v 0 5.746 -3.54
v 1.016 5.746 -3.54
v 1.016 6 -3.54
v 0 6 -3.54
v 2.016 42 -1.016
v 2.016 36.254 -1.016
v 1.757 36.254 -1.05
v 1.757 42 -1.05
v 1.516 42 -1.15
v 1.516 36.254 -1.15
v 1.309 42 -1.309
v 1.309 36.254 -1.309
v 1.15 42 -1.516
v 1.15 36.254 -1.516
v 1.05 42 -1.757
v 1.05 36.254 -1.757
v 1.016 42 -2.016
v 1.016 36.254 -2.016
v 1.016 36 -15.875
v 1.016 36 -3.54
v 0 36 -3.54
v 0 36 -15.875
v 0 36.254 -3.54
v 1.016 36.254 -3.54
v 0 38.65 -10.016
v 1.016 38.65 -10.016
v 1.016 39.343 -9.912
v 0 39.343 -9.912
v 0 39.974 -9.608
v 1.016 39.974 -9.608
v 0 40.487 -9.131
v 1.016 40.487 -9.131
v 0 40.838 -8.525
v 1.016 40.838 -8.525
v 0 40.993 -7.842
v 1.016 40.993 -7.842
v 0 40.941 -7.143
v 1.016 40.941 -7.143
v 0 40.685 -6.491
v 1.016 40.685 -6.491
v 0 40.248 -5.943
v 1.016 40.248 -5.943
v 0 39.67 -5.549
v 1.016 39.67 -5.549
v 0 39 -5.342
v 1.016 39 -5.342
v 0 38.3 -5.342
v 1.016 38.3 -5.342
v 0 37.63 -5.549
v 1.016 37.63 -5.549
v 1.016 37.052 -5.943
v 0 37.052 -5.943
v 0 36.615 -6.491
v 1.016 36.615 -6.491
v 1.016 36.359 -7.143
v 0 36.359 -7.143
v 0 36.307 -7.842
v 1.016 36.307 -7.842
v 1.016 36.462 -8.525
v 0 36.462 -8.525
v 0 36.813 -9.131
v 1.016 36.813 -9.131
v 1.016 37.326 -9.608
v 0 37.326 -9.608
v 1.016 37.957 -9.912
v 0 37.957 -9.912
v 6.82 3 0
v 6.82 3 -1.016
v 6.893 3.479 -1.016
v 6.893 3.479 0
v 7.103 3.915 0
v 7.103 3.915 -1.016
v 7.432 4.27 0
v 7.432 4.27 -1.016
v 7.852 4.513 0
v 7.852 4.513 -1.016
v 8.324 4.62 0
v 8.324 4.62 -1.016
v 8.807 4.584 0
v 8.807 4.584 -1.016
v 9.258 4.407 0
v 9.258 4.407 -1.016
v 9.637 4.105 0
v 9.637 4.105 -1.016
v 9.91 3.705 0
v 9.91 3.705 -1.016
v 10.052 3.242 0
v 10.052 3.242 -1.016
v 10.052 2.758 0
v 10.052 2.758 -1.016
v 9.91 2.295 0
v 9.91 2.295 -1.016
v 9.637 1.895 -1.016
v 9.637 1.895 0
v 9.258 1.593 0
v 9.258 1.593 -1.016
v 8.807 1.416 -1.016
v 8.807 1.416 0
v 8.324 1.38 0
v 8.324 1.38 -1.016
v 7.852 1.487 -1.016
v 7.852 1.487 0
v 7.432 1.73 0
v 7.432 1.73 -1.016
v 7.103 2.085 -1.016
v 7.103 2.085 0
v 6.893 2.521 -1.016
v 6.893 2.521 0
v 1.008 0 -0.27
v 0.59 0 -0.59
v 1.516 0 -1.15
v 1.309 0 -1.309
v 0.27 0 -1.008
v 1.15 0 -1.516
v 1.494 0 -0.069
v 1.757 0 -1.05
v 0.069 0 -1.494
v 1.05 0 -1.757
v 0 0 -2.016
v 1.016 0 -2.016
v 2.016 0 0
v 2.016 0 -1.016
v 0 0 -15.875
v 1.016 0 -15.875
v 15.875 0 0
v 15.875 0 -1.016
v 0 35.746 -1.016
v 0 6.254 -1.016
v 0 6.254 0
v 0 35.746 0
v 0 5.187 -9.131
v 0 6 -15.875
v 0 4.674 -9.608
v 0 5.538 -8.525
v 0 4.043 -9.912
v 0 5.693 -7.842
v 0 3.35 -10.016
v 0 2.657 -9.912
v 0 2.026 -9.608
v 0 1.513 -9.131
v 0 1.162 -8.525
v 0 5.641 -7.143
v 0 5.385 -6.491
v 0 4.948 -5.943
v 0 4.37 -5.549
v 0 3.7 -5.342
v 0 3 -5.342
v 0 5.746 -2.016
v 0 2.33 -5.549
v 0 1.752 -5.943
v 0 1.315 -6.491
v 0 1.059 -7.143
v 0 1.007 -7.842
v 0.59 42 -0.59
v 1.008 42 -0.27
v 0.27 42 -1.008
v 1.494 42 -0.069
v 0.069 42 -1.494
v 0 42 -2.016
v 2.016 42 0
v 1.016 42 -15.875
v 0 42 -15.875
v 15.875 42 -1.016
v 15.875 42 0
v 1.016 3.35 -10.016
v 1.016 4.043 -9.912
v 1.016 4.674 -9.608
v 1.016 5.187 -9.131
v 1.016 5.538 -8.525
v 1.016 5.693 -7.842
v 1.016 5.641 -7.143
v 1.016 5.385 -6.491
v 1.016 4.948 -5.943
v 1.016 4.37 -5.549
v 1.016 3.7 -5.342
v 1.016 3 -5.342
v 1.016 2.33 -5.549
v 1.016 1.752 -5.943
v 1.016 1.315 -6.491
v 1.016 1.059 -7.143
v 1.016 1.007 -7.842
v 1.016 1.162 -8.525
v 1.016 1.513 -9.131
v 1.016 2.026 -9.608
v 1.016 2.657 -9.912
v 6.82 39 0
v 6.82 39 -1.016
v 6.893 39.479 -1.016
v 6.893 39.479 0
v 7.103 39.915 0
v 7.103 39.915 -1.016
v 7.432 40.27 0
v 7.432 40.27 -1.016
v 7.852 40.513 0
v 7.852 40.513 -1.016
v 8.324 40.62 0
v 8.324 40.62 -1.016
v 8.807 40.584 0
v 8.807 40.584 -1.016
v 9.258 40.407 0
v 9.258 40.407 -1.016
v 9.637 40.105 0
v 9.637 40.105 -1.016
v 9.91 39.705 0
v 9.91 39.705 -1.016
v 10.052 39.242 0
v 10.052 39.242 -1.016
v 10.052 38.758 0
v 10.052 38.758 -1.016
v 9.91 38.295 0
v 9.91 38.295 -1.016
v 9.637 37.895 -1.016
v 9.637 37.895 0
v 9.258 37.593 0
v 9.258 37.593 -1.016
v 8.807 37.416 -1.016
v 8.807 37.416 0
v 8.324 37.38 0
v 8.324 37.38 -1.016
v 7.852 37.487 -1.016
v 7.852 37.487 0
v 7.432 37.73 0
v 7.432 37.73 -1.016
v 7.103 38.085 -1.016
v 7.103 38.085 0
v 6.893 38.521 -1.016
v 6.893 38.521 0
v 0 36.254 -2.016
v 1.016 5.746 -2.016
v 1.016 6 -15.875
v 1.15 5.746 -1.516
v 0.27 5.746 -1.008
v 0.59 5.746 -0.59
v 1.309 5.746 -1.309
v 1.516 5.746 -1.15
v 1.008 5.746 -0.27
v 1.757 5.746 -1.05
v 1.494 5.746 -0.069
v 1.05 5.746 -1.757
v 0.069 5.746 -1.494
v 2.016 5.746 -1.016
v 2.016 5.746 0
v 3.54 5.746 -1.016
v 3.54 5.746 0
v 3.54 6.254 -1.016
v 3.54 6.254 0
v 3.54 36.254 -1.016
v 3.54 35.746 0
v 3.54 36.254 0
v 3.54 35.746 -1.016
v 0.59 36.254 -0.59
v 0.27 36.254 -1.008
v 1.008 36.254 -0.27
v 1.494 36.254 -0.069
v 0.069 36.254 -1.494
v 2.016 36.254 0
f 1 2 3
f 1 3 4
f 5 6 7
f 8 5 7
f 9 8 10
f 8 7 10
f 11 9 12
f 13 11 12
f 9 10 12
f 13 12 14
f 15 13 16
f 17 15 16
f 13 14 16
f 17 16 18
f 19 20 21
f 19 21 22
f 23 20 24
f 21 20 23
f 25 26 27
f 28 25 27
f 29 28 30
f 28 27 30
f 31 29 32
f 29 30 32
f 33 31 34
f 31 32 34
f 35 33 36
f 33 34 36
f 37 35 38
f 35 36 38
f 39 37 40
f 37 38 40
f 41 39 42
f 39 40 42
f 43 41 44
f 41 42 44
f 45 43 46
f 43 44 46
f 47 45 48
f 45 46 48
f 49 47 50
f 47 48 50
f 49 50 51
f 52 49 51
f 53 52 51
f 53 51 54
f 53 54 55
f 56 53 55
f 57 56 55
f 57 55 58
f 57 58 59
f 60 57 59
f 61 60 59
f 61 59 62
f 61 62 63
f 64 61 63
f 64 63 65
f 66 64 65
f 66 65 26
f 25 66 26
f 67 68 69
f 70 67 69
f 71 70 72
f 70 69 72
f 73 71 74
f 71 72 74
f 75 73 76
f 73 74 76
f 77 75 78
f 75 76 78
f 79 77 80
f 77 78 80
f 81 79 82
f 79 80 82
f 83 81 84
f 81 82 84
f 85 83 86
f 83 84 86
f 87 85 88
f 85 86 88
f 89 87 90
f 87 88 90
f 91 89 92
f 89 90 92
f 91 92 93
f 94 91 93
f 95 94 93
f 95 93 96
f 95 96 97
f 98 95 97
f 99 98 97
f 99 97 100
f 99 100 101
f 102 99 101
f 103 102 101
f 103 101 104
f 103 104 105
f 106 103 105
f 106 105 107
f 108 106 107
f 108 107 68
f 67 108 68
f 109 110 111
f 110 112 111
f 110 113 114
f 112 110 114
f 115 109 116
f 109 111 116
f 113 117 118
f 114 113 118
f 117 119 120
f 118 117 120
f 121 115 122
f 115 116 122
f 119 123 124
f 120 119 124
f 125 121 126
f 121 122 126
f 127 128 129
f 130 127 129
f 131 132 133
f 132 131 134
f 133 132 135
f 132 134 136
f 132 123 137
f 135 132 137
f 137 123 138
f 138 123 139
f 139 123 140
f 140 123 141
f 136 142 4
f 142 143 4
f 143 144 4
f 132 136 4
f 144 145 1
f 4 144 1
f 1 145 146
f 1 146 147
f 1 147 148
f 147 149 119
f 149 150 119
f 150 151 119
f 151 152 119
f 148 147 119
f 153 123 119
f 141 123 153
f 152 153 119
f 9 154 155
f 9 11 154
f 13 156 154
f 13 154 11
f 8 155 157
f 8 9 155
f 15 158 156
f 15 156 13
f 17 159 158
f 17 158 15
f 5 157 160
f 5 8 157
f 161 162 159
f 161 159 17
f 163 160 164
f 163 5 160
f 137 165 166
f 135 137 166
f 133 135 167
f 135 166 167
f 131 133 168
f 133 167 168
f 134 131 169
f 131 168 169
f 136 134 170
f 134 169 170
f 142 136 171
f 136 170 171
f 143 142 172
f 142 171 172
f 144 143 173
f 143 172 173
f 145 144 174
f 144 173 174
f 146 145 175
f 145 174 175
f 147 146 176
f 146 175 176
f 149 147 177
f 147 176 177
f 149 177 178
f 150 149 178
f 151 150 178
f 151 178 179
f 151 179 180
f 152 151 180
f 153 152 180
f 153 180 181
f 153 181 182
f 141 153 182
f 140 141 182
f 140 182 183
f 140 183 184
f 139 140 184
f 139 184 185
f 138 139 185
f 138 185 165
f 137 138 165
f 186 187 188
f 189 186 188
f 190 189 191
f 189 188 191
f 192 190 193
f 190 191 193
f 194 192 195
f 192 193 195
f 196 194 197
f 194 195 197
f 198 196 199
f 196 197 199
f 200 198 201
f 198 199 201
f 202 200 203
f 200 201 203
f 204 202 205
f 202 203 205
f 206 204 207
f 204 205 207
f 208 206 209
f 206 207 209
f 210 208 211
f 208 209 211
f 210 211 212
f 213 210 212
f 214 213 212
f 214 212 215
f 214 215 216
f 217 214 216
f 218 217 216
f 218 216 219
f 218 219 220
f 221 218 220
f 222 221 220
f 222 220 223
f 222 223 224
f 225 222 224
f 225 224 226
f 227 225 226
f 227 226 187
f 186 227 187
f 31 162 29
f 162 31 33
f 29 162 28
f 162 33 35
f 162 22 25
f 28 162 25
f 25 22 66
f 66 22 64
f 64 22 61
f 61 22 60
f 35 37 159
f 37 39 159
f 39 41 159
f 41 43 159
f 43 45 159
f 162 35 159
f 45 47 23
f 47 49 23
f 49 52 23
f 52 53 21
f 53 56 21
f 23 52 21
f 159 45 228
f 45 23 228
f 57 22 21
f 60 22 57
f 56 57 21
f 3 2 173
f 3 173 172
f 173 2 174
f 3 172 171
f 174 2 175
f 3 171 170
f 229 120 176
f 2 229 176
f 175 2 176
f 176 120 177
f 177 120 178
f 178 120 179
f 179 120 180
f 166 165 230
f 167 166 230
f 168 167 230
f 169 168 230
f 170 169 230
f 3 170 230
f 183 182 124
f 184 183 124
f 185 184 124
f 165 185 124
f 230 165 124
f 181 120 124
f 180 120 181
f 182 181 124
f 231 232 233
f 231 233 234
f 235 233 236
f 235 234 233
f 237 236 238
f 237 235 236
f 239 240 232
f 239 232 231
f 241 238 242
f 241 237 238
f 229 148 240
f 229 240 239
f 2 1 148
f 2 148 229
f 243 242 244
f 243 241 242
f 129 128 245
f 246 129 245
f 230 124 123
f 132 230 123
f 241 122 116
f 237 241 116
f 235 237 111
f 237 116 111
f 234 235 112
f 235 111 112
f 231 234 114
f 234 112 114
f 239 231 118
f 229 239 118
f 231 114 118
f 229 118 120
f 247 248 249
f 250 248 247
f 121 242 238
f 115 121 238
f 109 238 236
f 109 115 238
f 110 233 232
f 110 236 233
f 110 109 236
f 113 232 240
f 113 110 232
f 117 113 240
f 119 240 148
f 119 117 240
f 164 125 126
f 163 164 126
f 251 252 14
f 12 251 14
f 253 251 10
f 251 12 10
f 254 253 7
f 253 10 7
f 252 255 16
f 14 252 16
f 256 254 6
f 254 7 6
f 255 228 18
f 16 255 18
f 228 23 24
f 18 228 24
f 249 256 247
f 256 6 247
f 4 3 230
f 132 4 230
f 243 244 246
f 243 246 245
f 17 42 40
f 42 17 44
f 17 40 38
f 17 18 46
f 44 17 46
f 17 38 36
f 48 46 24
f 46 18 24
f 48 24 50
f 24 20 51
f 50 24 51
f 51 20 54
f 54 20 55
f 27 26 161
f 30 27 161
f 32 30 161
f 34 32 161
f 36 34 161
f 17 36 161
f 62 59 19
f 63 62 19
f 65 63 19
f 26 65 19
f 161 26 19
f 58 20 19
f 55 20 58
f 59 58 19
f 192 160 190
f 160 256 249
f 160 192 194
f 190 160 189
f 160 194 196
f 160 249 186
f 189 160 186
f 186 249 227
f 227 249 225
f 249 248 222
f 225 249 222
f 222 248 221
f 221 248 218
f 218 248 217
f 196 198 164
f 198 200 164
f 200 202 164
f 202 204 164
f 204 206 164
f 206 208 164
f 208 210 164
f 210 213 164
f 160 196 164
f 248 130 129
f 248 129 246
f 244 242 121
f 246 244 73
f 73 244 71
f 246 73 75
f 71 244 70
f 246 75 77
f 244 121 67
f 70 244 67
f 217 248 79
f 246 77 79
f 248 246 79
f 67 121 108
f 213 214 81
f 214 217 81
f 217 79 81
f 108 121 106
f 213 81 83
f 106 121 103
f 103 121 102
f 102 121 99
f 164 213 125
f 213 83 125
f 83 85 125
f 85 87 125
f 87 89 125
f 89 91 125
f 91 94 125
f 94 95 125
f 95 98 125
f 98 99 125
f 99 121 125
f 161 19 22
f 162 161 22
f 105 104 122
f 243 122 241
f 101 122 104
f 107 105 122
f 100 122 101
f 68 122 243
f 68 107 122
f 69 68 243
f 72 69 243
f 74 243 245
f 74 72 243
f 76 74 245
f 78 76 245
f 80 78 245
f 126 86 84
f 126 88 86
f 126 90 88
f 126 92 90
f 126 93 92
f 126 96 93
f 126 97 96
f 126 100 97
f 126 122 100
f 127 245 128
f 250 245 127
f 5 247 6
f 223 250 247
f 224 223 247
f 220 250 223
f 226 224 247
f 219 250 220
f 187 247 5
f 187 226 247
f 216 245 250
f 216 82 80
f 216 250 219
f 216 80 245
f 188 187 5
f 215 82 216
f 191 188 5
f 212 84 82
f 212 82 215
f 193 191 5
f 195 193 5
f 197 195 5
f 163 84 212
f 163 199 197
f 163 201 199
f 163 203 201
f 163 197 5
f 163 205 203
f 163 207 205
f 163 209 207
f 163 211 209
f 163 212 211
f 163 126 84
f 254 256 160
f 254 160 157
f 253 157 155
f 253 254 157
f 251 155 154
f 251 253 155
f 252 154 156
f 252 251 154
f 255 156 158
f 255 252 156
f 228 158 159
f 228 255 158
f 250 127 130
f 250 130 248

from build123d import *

# Parameters (mm, degrees)
BOSS_EXTRUDE1_DEPTH    = 42
SKETCH4_W              = 14.859
SKETCH4_H              = 30
CUT_EXTRUDE2_DEPTH     = 6.35
SKETCH6_R              = 2.35
CUT_EXTRUDE3_DEPTH     = 6.35
CUT_EXTRUDE4_REACH     = 49.295
SKETCH7_R              = 1.625
CONVERT_SOLID1_DEPTH   = 6.254
CONVERT_SOLID1_START   = 35.746
CONVERT_SOLID1_2_DEPTH = 6.254
CONVERT_SOLID1_START_2 = 5.746
CONVERT_SOLID1_3_DEPTH = 0.508
CONVERT_SOLID1_4_DEPTH = 0.508
CONVERT_SOLID1_5_DEPTH = 5.746
CONVERT_SOLID1_START_3 = 36.254
CONVERT_SOLID1_6_DEPTH = 5.746


# Read off the part's stored shape, not the designer's step: Convert-Solid1
with BuildPart() as part:
    # Sketch1 → Boss-Extrude1 (new body)
    with BuildSketch(Plane(origin=(0, 0, 0), x_dir=(1, 0, 0), z_dir=(0, 1, 0))):
        Polygon((0, 0), (15.875, 0), (15.875, 1.016), (1.016, 1.016), (1.016, 15.875), (0, 15.875), align=None)
    extrude(amount=BOSS_EXTRUDE1_DEPTH)

    # Sketch4 → Cut-Extrude2 (cut)
    with BuildSketch(Plane(origin=(1.016, 0, 0), x_dir=(0, 0, -1), z_dir=(1, 0, 0))):
        with Locations((8.4455, 21)):
            Rectangle(SKETCH4_W, SKETCH4_H)
    extrude(amount=-CUT_EXTRUDE2_DEPTH, mode=Mode.SUBTRACT)

    # Sketch6 → Cut-Extrude3 (cut)
    with BuildSketch(Plane(origin=(1.016, 0, 0), x_dir=(0, 0, -1), z_dir=(1, 0, 0))):
        with Locations((7.666, 3.35)):
            Circle(SKETCH6_R)
        with Locations((7.666, 38.65)):
            Circle(SKETCH6_R)
    extrude(amount=-CUT_EXTRUDE3_DEPTH, mode=Mode.SUBTRACT)

    # Sketch7 → Cut-Extrude4 (cut, up to next)
    with BuildSketch(Plane(origin=(0, 0, -1.016), x_dir=(-1, 0, 0), z_dir=(0, 0, -1)), mode=Mode.PRIVATE) as cut_extrude4_sk1:
        with Locations((-8.4455, 39)):
            Circle(SKETCH7_R)
    cut_extrude4_tool1 = extrude(cut_extrude4_sk1.sketch, amount=-CUT_EXTRUDE4_REACH, mode=Mode.PRIVATE) & part.part
    # Sketch7 → Cut-Extrude4 (cut, up to next)
    with BuildSketch(Plane(origin=(0, 0, -1.016), x_dir=(-1, 0, 0), z_dir=(0, 0, -1)), mode=Mode.PRIVATE) as cut_extrude4_sk2:
        with Locations((-8.4455, 3)):
            Circle(SKETCH7_R)
    cut_extrude4_tool2 = extrude(cut_extrude4_sk2.sketch, amount=-CUT_EXTRUDE4_REACH, mode=Mode.PRIVATE) & part.part
    add(cut_extrude4_tool1.solids().sort_by_distance((8.4455, 39, -1.016))[0], mode=Mode.SUBTRACT)
    add(cut_extrude4_tool2.solids().sort_by_distance((8.4455, 3, -1.016))[0], mode=Mode.SUBTRACT)

    # Convert-Solid1 outline → Convert-Solid1 (cut)
    with BuildSketch(Plane(origin=(0, 0, 0), x_dir=(1, 0, 0), z_dir=(0, 1, 0))):
        with BuildLine():
            Line((0, 0), (2.016, 0))
            ThreePointArc((2.016, 0), (0.590472729, 0.590472729), (0, 2.016))
            Line((0, 2.016), (0, 0))
        make_face()
    extrude(amount=CONVERT_SOLID1_DEPTH, mode=Mode.SUBTRACT)

    # Convert-Solid1 2 outline → Convert-Solid1 2 (cut)
    with BuildSketch(Plane(origin=(0, 0, 0), x_dir=(1, 0, 0), z_dir=(0, 1, 0)).offset(CONVERT_SOLID1_START)):
        with BuildLine():
            Line((0, 0), (2.016, 0))
            ThreePointArc((2.016, 0), (0.590472729, 0.590472729), (0, 2.016))
            Line((0, 2.016), (0, 0))
        make_face()
    extrude(amount=CONVERT_SOLID1_2_DEPTH, mode=Mode.SUBTRACT)

    # Convert-Solid1 3 outline → Convert-Solid1 3 (cut)
    with BuildSketch(Plane(origin=(0, 0, 0), x_dir=(1, 0, 0), z_dir=(0, 1, 0)).offset(CONVERT_SOLID1_START_2)):
        with BuildLine():
            Line((2.016, 0), (3.54, 0))
            Line((3.54, 0), (3.54, 1.016))
            Line((3.54, 1.016), (1.016, 1.016))
            Line((1.016, 1.016), (1.016, 3.54))
            Line((1.016, 3.54), (0, 3.54))
            Line((0, 3.54), (0, 2.016))
            ThreePointArc((0, 2.016), (0.590472729, 0.590472729), (2.016, 0))
        make_face()
    extrude(amount=CONVERT_SOLID1_3_DEPTH, mode=Mode.SUBTRACT)

    # Convert-Solid1 4 outline → Convert-Solid1 4 (cut)
    with BuildSketch(Plane(origin=(0, 0, 0), x_dir=(1, 0, 0), z_dir=(0, 1, 0)).offset(CONVERT_SOLID1_START)):
        with BuildLine():
            Line((2.016, 0), (3.54, 0))
            Line((3.54, 0), (3.54, 1.016))
            Line((3.54, 1.016), (1.016, 1.016))
            Line((1.016, 1.016), (1.016, 3.54))
            Line((1.016, 3.54), (0, 3.54))
            Line((0, 3.54), (0, 2.016))
            ThreePointArc((0, 2.016), (0.590472729, 0.590472729), (2.016, 0))
        make_face()
    extrude(amount=CONVERT_SOLID1_4_DEPTH, mode=Mode.SUBTRACT)

    # Convert-Solid1 5 outline → Convert-Solid1 5 (add)
    with BuildSketch(Plane(origin=(0, 0, 0), x_dir=(1, 0, 0), z_dir=(0, 1, 0))):
        with BuildLine():
            Line((1.016, 1.016), (2.016, 1.016))
            ThreePointArc((2.016, 1.016), (1.308893219, 1.308893219), (1.016, 2.016))
            Line((1.016, 2.016), (1.016, 1.016))
        make_face()
    extrude(amount=CONVERT_SOLID1_5_DEPTH)

    # Convert-Solid1 6 outline → Convert-Solid1 6 (add)
    with BuildSketch(Plane(origin=(0, 0, 0), x_dir=(1, 0, 0), z_dir=(0, 1, 0)).offset(CONVERT_SOLID1_START_3)):
        with BuildLine():
            Line((1.016, 1.016), (2.016, 1.016))
            ThreePointArc((2.016, 1.016), (1.308893219, 1.308893219), (1.016, 2.016))
            Line((1.016, 2.016), (1.016, 1.016))
        make_face()
    extrude(amount=CONVERT_SOLID1_6_DEPTH)


solid = part.part
